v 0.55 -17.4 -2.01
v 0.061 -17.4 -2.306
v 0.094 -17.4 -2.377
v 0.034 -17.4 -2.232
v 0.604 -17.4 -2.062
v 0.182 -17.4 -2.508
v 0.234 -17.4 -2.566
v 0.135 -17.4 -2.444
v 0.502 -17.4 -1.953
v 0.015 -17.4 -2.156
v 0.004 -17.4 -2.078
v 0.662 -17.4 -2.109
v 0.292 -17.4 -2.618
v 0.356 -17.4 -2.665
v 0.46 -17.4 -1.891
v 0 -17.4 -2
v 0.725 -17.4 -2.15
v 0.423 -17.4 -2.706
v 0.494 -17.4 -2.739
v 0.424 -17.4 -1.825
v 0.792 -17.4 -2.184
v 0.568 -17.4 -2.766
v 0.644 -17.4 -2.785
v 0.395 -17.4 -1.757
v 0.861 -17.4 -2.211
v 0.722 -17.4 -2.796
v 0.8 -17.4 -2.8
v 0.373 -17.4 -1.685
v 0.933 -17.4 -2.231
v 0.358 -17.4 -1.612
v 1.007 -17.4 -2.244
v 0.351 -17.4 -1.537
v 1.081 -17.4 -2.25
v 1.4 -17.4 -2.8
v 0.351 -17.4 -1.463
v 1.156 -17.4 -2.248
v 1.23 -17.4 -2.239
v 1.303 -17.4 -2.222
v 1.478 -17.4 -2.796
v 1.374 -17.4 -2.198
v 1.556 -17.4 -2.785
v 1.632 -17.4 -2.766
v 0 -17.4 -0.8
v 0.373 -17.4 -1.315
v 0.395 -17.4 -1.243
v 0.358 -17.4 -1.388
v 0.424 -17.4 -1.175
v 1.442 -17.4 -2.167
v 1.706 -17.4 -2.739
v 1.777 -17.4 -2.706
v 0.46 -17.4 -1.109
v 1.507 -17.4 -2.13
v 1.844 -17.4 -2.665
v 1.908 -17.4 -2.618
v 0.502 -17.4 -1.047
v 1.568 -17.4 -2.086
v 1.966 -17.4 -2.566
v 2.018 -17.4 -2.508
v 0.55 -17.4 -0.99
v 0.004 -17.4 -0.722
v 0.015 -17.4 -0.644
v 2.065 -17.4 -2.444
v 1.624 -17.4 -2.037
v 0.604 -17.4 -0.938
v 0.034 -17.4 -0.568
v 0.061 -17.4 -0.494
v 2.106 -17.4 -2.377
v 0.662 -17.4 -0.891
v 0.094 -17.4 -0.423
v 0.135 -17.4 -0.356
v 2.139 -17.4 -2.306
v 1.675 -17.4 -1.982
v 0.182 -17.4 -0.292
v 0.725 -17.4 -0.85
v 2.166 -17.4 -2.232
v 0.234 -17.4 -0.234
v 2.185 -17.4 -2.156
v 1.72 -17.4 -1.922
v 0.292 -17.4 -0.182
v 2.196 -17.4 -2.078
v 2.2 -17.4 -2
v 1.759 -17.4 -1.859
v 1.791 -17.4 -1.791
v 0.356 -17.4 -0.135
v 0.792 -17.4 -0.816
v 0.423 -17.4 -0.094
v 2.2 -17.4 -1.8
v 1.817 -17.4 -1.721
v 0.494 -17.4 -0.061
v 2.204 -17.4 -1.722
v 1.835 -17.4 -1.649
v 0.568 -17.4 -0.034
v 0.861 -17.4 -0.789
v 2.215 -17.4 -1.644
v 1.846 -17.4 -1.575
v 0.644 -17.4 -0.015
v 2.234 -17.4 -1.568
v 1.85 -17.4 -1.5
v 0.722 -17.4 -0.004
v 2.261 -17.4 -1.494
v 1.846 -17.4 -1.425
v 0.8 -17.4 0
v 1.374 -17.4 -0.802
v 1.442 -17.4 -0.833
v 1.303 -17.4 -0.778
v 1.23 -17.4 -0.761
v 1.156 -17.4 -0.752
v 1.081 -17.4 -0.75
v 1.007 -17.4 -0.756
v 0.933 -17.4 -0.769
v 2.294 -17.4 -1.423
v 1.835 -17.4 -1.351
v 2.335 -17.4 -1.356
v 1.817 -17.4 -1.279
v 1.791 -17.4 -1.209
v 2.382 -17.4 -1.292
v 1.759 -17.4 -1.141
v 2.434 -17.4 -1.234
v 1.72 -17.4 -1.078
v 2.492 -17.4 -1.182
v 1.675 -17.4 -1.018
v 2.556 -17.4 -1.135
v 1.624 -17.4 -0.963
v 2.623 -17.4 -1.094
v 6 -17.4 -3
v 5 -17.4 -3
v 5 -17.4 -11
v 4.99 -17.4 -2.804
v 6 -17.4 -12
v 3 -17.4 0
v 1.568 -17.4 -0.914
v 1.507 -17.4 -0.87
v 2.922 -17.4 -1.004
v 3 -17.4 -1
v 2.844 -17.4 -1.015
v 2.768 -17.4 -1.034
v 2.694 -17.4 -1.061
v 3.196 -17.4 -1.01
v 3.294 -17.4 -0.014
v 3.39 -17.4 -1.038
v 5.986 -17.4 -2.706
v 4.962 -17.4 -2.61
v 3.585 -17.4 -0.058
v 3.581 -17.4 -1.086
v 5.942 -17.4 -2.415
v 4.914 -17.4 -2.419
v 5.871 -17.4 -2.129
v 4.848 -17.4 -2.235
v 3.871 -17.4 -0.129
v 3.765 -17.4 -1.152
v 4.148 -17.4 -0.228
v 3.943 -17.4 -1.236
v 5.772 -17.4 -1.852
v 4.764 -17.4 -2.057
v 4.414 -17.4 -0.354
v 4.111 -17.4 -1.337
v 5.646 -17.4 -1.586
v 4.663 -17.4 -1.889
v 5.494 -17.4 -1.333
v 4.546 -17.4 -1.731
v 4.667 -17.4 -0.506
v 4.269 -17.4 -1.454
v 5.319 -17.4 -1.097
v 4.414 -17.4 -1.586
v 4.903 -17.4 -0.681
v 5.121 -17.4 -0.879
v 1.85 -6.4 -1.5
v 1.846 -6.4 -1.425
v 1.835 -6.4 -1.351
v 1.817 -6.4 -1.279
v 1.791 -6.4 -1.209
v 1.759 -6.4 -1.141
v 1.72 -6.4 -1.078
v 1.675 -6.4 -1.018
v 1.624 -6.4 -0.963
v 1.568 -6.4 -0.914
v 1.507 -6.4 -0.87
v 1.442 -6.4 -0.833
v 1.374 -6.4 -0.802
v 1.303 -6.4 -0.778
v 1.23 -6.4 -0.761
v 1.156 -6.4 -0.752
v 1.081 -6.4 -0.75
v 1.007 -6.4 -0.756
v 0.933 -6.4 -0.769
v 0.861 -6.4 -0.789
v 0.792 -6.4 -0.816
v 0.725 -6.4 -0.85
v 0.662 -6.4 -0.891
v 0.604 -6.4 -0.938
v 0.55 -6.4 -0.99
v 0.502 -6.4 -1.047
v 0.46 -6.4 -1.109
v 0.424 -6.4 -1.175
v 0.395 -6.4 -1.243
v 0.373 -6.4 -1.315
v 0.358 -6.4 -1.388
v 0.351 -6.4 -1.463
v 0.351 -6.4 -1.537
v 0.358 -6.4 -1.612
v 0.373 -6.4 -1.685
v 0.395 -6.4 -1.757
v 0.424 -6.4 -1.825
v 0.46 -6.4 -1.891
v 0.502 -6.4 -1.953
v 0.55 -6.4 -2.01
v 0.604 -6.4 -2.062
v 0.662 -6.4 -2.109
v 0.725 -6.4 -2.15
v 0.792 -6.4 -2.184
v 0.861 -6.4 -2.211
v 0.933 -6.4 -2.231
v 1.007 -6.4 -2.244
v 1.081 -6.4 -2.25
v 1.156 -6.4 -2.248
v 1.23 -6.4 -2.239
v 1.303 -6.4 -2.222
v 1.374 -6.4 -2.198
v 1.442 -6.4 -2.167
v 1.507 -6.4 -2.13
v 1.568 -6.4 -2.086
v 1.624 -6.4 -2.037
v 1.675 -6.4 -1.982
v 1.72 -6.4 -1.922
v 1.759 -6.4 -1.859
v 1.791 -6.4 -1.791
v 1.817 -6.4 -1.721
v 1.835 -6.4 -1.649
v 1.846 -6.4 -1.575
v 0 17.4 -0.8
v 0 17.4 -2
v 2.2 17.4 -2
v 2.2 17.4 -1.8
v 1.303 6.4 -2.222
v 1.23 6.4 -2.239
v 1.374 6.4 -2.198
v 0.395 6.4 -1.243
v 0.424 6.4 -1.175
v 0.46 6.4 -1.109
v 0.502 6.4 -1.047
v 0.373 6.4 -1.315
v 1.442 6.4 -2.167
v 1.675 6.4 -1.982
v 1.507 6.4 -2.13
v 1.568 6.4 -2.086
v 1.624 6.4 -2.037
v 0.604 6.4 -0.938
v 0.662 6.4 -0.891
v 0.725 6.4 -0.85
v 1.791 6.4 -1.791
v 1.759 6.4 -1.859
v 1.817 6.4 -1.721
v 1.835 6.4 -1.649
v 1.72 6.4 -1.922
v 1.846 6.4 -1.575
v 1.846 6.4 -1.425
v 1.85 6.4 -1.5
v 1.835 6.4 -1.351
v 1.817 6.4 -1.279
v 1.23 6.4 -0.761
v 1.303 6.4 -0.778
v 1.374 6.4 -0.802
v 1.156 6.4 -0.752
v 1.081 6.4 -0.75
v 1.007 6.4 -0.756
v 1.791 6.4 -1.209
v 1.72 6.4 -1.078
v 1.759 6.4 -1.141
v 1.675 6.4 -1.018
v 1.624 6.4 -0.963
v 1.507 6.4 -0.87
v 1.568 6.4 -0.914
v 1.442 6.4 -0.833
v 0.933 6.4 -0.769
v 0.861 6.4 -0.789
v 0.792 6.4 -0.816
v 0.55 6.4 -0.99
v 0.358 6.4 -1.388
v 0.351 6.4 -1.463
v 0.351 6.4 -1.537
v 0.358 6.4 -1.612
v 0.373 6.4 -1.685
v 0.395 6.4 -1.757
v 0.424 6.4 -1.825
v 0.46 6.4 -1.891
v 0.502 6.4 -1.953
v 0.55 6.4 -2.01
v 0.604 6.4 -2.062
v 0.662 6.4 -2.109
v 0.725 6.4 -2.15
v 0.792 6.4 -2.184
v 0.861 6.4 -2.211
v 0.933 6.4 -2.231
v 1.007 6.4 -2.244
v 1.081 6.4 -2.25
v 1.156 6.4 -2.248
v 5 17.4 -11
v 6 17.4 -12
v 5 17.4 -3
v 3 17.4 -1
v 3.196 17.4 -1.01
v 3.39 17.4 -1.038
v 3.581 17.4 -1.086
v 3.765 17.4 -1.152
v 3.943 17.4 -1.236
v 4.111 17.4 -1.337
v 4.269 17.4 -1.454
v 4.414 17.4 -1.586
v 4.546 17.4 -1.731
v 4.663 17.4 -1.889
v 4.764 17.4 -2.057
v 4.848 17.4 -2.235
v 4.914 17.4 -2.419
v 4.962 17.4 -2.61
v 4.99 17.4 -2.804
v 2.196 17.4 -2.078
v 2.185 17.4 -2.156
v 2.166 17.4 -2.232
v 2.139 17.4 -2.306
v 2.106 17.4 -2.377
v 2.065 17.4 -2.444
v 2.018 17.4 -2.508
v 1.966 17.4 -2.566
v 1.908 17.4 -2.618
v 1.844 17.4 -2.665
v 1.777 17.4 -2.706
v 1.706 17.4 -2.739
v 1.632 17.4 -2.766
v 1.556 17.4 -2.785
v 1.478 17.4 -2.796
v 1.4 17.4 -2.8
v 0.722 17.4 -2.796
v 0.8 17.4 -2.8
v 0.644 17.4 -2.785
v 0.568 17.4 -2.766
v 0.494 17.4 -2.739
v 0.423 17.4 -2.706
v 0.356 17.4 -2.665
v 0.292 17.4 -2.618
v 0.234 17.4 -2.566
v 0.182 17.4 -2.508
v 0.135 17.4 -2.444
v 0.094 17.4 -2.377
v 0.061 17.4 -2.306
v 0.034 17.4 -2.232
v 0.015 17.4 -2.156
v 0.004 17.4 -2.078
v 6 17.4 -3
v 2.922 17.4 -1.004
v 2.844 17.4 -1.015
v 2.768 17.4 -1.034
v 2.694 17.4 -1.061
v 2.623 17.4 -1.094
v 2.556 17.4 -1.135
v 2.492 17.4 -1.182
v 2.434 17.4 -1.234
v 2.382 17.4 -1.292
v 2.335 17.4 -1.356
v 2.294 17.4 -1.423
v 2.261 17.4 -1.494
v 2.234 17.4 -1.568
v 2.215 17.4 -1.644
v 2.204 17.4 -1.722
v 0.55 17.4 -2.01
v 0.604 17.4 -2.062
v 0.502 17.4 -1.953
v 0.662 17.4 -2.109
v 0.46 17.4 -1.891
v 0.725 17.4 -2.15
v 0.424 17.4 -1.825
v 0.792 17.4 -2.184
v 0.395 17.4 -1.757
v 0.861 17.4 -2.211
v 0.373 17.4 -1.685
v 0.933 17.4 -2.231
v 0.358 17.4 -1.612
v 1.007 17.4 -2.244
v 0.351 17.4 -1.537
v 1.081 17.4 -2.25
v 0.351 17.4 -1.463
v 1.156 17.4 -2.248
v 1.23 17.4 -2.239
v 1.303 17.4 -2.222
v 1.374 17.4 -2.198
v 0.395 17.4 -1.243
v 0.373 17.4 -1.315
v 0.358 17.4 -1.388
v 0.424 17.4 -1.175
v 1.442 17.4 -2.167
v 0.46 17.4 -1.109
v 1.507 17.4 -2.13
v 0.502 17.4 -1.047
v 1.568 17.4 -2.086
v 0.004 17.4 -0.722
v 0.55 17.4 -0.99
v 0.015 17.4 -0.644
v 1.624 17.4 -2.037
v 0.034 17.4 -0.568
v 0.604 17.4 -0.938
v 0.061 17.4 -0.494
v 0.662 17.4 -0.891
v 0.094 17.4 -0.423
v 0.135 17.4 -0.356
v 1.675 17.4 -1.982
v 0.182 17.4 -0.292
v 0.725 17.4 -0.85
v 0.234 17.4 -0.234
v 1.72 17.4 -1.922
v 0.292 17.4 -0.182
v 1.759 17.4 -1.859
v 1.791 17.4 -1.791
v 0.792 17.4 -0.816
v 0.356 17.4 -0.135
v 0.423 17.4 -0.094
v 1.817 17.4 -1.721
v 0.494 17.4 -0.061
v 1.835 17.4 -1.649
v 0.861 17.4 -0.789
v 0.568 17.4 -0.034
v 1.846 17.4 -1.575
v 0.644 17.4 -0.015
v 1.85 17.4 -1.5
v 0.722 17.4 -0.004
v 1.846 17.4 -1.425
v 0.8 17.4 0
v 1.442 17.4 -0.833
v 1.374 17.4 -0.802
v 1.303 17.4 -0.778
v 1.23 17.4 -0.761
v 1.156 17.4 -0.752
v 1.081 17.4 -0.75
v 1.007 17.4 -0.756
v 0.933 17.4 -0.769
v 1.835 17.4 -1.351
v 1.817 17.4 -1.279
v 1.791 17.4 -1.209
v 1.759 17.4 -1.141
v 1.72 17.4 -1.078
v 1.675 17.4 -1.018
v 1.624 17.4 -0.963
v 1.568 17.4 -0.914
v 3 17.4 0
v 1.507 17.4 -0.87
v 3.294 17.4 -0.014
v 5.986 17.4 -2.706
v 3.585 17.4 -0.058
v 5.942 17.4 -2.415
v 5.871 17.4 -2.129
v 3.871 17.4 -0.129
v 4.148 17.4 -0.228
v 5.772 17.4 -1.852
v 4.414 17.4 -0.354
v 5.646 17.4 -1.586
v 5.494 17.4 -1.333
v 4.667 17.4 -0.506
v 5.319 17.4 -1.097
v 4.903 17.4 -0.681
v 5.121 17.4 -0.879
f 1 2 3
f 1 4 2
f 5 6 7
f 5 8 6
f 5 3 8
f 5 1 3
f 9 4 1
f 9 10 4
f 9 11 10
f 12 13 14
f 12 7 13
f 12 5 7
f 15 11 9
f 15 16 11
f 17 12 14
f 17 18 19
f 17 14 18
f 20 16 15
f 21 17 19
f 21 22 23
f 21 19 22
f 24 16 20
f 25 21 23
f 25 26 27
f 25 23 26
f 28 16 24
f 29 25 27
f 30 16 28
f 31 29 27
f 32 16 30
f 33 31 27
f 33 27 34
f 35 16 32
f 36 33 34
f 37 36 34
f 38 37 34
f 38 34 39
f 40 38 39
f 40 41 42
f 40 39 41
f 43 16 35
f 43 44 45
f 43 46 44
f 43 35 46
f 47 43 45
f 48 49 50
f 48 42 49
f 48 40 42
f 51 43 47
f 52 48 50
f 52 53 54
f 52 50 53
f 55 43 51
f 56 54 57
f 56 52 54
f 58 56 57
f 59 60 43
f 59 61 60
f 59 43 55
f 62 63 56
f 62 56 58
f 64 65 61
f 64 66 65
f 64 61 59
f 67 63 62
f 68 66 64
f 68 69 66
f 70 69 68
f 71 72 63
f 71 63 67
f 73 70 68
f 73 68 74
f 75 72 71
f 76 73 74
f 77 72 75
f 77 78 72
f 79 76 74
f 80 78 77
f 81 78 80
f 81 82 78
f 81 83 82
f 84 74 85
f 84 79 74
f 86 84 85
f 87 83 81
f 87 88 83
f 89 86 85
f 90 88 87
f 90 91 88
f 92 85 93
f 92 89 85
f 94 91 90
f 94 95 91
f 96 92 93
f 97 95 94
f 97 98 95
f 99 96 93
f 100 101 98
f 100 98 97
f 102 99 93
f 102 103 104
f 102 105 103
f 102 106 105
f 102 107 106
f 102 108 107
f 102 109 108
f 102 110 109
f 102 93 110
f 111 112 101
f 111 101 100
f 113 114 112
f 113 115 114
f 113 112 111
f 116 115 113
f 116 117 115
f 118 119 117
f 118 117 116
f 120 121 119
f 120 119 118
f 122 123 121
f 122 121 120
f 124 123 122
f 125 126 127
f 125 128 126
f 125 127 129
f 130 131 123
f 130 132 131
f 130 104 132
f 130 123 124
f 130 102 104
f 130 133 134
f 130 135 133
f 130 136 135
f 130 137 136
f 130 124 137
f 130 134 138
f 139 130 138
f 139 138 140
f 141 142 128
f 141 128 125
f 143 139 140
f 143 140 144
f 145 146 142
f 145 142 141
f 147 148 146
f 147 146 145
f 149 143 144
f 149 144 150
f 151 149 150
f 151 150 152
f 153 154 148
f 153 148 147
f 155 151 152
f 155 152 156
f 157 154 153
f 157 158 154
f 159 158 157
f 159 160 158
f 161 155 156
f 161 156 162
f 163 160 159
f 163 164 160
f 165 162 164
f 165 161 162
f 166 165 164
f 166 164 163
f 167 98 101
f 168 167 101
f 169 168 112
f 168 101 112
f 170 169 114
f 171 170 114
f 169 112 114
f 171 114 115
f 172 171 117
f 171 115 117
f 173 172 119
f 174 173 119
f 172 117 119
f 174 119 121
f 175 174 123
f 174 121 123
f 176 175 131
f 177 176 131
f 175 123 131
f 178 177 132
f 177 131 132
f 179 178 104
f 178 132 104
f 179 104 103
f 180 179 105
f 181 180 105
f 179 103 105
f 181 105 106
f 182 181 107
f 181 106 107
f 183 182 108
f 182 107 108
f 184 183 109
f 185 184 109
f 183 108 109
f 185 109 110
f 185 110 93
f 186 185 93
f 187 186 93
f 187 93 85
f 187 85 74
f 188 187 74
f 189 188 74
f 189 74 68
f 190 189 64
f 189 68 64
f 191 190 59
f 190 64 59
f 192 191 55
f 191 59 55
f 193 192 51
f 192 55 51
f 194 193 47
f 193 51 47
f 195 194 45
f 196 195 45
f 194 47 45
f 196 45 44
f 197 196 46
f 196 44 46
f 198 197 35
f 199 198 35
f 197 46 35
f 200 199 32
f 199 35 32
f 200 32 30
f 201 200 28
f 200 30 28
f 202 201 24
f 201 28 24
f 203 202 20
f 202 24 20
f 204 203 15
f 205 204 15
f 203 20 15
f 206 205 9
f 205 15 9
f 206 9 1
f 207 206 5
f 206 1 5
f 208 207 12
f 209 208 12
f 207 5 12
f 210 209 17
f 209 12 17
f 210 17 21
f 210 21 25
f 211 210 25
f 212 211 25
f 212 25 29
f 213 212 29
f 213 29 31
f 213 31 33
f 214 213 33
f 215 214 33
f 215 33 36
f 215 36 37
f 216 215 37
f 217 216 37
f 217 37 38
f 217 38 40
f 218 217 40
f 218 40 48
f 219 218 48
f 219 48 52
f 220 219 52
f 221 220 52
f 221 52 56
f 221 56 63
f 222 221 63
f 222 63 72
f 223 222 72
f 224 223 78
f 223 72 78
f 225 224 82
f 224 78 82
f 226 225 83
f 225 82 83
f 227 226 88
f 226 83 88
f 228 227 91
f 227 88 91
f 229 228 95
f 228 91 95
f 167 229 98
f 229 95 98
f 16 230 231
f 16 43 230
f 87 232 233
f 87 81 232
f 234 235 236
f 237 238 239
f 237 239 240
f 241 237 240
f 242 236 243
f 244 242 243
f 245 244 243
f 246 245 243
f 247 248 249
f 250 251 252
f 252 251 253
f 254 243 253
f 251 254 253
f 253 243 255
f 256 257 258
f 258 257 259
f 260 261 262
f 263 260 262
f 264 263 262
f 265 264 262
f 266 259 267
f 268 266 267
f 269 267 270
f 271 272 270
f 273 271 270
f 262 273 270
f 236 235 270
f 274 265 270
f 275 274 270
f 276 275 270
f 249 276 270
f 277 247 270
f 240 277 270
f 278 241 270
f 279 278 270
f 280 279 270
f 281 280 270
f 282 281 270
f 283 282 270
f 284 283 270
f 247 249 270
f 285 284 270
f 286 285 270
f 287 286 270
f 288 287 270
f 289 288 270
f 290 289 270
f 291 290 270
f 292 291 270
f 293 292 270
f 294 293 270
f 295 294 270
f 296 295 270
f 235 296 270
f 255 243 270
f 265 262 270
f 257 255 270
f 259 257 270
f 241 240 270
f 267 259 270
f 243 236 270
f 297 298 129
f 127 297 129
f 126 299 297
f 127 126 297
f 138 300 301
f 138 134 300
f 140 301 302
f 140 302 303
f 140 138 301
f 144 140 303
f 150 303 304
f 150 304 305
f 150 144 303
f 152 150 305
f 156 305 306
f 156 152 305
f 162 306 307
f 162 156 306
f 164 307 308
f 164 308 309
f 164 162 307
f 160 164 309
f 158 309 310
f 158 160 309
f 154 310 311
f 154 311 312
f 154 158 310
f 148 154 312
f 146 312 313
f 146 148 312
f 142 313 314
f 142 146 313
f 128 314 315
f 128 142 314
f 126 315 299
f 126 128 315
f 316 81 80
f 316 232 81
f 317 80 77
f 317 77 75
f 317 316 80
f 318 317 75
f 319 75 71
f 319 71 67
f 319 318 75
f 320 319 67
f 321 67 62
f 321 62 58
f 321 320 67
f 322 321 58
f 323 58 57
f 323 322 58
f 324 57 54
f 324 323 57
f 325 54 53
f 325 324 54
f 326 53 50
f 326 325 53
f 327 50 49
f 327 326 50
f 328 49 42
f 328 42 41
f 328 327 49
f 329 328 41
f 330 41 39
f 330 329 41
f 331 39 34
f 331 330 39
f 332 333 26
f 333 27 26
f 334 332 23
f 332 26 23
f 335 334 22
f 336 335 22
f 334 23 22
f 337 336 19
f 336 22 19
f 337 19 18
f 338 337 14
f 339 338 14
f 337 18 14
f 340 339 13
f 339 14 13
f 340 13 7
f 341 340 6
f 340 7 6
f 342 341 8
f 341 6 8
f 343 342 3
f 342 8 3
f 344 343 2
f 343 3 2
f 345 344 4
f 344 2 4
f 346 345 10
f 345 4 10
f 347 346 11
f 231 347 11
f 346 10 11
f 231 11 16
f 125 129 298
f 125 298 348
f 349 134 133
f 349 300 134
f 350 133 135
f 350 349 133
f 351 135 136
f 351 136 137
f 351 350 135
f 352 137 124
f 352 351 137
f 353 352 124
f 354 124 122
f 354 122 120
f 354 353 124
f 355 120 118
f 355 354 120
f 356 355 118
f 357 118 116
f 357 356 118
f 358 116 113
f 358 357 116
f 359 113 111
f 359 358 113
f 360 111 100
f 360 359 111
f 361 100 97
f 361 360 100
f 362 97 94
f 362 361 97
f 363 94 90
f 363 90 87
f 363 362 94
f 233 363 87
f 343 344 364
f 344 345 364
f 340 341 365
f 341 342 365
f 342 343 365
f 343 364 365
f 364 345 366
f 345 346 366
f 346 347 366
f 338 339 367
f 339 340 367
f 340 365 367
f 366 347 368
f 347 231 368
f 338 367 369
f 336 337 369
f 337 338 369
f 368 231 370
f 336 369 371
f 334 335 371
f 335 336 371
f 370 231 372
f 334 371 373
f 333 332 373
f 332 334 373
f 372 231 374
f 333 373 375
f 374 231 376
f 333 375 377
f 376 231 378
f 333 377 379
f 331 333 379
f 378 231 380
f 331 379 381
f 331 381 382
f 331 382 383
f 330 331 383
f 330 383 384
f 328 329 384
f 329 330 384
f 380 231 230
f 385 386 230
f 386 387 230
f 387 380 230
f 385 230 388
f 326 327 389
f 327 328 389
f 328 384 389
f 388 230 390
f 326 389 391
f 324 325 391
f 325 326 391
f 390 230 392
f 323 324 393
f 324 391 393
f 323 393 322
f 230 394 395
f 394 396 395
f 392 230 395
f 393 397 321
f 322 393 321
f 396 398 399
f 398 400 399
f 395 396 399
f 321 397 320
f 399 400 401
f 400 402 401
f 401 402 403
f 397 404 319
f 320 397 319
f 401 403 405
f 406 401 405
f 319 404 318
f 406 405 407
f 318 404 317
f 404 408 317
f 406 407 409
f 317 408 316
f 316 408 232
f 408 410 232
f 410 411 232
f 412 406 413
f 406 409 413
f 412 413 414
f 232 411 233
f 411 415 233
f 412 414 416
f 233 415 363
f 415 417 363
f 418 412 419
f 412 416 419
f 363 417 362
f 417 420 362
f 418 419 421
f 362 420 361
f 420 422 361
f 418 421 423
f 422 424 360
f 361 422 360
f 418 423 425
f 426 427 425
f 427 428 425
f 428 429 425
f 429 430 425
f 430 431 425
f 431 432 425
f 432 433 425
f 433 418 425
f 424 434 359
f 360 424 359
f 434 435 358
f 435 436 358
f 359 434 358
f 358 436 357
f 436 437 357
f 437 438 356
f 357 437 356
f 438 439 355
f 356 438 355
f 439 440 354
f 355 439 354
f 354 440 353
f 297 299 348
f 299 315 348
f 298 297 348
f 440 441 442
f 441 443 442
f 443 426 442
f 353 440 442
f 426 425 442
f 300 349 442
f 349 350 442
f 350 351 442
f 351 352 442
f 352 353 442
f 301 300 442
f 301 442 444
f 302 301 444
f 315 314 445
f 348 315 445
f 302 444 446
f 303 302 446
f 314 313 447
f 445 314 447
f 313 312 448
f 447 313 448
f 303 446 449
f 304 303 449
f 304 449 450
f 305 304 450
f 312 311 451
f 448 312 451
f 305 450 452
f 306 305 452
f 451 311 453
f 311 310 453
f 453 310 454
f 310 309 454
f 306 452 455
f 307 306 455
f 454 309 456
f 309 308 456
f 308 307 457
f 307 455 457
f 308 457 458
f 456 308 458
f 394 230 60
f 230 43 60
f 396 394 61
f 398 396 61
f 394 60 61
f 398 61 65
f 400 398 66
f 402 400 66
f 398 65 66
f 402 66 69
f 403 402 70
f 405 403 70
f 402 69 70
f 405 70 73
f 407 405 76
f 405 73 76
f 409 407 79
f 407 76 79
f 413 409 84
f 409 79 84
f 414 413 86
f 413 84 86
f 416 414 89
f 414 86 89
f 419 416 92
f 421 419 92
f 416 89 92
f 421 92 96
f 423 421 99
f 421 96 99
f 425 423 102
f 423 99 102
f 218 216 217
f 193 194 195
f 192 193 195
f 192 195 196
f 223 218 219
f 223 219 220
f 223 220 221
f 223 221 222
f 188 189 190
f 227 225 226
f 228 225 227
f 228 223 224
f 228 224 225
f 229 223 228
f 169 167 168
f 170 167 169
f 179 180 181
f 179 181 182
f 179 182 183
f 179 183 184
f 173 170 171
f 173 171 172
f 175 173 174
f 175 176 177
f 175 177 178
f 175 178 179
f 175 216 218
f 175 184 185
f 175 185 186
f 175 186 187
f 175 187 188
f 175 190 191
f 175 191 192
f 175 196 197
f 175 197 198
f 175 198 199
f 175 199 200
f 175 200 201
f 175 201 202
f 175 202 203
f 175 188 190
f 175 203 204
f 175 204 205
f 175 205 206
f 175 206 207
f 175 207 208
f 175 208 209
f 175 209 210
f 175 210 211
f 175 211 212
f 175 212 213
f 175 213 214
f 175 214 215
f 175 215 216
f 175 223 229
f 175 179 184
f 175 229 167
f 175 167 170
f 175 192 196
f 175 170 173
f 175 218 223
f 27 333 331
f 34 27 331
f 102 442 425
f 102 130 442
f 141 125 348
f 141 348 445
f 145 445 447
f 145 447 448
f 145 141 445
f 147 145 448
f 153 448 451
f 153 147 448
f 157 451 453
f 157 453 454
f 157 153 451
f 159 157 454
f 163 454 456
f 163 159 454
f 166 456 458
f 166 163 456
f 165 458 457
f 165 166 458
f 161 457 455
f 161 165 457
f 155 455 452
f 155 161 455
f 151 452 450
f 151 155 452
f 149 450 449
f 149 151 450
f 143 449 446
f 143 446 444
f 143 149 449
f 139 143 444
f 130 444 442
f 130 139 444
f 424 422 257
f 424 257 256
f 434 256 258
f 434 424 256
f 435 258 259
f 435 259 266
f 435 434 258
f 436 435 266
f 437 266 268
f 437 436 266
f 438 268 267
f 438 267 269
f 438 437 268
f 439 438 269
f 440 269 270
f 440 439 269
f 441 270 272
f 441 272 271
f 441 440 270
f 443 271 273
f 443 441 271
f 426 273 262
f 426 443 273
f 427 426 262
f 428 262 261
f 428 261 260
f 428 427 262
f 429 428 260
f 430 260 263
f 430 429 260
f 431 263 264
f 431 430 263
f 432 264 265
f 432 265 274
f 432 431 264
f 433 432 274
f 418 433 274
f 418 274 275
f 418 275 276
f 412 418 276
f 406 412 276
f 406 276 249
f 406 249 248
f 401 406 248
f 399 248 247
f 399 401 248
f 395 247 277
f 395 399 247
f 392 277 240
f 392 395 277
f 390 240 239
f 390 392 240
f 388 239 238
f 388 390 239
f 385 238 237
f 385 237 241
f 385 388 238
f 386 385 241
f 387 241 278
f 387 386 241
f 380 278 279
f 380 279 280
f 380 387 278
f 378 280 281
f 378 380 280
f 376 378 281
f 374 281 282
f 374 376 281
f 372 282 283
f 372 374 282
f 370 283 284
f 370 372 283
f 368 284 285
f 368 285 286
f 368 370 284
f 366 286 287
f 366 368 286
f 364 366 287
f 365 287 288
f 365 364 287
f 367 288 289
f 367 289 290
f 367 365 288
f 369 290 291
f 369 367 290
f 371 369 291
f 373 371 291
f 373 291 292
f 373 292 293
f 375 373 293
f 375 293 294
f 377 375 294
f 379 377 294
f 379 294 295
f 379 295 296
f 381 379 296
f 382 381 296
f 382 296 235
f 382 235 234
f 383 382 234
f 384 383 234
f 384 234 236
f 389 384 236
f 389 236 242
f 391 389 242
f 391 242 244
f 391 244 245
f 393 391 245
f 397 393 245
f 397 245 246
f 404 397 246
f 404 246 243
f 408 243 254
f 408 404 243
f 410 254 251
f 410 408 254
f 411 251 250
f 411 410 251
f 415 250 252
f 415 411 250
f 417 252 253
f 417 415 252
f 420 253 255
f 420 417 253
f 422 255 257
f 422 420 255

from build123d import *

# Parameters (mm, degrees)
F1_DEPTH = 17.4
F2_R     = 0.75
F3_DEPTH = 11
F4_R     = 0.79999
F5_SIZE  = 0.99999


# Not quite as in the source:
# - a fillet or chamfer is up to 0.001 mm smaller than in the source, because OpenCascade refuses the exact size
# - a pattern or mirror of a feature is missing from the dataset's text; its kind, count and spacing are read off the source's solid


with BuildPart() as f1:
    # F0 (on Front) → F1 (new body, symmetric)
    with BuildSketch(Plane.XZ):
        with BuildLine():
            ThreePointArc((3, -1), (4.4142135624, -1.5857864376), (5, -3))
            Line((5, -3), (5, -12))
            Line((5, -12), (6, -12))
            Line((6, -12), (6, -3))
            ThreePointArc((6, -3), (5.1213203436, -0.8786796564), (3, 0))
            Line((3, 0), (0, 0))
            Line((0, 0), (0, -2.8))
            Line((0, -2.8), (2.2, -2.8))
            Line((2.2, -2.8), (2.2, -1))
            Line((2.2, -1), (3, -1))
        make_face()
    extrude(amount=F1_DEPTH, both=True)

    # F2 (on face) → F3 (cut)
    with BuildSketch(Plane.XZ.offset(17.4)):
        with Locations((1.1, -1.5)):
            Circle(F2_R)
    f3 = extrude(amount=-F3_DEPTH, mode=Mode.SUBTRACT)

    # F3_copies: F3 across plane
    add(f3.mirror(Plane.ZX), mode=Mode.SUBTRACT)

    # F4 (radius 0.8 in the source; OpenCascade refuses exactly that, so slightly less here)
    f4_edges = [f1.edges().sort_by_distance(p)[0] for p in [
        (2.2, 0, -1),
        (2.2, 0, -2.8),
        (0, 0, -2.8),
        (0, 0, 0),
    ]]
    fillet(f4_edges, radius=F4_R)

    # F5 (size 1 in the source; OpenCascade refuses exactly that, so slightly less here)
    f5_edges = [f1.edges().sort_by_distance(p)[0] for p in [
        (5, 0, -12),
    ]]
    chamfer(f5_edges, length=F5_SIZE)


solid = f1.part
